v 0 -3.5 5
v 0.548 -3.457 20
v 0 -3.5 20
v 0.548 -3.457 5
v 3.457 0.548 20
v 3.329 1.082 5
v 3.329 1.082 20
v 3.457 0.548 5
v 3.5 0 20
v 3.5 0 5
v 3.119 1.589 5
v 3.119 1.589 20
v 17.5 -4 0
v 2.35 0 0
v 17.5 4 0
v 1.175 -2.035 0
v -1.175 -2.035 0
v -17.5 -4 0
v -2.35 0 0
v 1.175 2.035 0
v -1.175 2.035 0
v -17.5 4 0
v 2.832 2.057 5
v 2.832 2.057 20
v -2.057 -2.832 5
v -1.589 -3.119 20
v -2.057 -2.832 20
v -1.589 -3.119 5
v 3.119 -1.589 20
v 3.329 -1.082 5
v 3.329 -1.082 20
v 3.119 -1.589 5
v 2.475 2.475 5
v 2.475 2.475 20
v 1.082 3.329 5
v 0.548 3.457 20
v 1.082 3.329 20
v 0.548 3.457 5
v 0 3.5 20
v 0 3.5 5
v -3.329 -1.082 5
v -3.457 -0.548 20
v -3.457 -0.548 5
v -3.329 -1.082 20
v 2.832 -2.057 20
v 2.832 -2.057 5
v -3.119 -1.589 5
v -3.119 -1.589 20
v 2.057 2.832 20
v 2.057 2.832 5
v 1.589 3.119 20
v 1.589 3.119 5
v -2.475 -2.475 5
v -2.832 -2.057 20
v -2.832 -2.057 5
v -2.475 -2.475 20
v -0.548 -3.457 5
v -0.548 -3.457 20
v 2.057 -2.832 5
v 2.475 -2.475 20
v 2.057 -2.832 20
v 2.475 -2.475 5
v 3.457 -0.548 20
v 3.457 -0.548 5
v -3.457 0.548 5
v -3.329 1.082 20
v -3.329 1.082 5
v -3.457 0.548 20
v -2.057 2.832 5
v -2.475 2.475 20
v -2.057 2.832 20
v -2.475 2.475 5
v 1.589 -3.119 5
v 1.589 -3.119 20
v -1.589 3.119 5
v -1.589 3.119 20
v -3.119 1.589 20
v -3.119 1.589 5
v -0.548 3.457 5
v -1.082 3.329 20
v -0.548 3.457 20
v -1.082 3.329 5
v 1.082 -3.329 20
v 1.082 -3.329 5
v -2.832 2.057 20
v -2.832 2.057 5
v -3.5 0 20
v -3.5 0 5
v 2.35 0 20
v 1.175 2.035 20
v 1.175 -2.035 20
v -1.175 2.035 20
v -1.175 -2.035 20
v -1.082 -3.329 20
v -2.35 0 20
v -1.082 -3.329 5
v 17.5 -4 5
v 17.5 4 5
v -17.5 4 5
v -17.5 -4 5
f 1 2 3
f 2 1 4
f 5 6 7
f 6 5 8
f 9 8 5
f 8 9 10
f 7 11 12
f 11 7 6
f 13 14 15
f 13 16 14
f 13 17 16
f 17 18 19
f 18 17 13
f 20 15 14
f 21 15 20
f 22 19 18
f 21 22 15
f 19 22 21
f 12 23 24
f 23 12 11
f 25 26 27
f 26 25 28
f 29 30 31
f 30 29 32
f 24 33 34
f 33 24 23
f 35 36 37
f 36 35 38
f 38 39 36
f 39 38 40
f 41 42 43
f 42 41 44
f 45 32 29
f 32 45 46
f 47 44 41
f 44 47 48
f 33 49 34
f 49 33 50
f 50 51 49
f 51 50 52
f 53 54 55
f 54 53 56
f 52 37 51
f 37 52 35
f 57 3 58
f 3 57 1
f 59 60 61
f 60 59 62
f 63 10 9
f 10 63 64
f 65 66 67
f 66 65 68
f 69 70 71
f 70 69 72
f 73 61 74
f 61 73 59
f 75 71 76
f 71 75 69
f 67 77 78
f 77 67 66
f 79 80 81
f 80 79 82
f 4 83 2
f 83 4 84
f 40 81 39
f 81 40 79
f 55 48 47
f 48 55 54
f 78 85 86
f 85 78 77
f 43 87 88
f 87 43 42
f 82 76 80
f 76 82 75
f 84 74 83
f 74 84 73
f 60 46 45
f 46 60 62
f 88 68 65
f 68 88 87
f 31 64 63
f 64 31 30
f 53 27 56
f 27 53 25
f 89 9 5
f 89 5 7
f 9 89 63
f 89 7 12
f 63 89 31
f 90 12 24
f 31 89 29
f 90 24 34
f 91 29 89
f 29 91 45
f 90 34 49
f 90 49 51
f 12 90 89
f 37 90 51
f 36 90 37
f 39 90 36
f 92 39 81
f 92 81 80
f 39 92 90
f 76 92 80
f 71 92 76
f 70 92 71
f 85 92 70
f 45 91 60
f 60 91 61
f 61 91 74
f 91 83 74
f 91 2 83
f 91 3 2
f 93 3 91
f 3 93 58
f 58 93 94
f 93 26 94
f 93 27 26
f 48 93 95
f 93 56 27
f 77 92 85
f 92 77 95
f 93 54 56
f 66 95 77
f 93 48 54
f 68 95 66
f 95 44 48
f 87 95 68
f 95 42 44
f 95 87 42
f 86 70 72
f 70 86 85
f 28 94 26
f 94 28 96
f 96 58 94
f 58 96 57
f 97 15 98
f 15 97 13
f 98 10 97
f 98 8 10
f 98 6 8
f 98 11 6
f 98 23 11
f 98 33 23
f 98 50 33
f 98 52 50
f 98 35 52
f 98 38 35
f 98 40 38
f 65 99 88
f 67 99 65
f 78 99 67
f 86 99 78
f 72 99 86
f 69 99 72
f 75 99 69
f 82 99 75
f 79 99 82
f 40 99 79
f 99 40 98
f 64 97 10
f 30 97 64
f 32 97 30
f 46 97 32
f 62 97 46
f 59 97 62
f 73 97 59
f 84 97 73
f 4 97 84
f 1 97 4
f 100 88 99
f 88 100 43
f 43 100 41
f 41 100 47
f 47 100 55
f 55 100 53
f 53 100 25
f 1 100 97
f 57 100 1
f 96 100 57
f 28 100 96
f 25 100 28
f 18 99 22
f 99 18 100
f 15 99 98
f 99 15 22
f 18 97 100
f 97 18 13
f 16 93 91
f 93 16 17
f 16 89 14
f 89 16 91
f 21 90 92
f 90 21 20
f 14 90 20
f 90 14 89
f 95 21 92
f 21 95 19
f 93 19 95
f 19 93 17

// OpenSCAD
$fn = 40;

module standoff(h, r, cst=1, csb=0) {
  nipple_h = h * 0.8;
  screw_size = 2.0;
  screw_hsize = screw_size / 2.0;
  nut_w = 4.35;
  nut_h = 1.45;
  tol = 0.2;

	// Standoff
  difference() {
    // Standoff body
    cylinder(h=h, r=r, center=true);

    // Screw hole
    translate([0.0, 0.0, h / 2.0 - nipple_h / 2.0]) {
      cylinder(h=nipple_h + 0.1, r=screw_hsize + tol, center=true);
    }

    // Nut-counter-sink top
    if (cst) {
      translate([0.0, 0.0, h / 2.0 - nut_h / 2.0]) {
        cylinder(h=nut_h + 0.01, r=nut_w / 2.0, $fn=6, center=true);
      }
    }

    // Nut-counter-sink bottom
    if (csb) {
      translate([0.0, 0.0, -h / 2.0 + nut_h / 2.0]) {
        cylinder(h=nut_h + 0.01, r=nut_w / 2.0, $fn=6, center=true);
      }
    }
  }

	// Fillet
	if (csb == 0) {
    fillet_h_inc = 0.1;
    fillet_h = 2.0;
    for (fillet_height = [fillet_h_inc:fillet_h_inc:fillet_h]) {
      translate([0.0, 0.0, -h / 2.0 + fillet_height])
        cylinder(h=0.1, r=r * 1.5 - fillet_height);
    }
  }
}

module nuc_standoffs(w, d, h, r) {
  x = 0.0;
  y = 0.0;
  z = h / 2;

  translate([x, y, z]) {
    translate([-d / 2.0, -w / 2.0, 0.0])
      standoff(h, r);

    translate([d / 2.0, -w / 2.0, 0.0])
      standoff(h, r);

    translate([d / 2.0, w / 2.0, 0.0])
      standoff(h, r);

    translate([-d / 2.0, w / 2.0, 0.0])
      standoff(h, r);
  };
}

module pololu_standoffs() {
  screw_size = 2.0;
  screw_hsize = screw_size / 2.0;
  tol = 1.2;

  mount_w = 43.2;
  mount_d = 10.2;
  mount_h = 6.0;

  translate([mount_w / 2.0, mount_d / 2.0, mount_h / 2.0])
    standoff(h=mount_h, r=3.25);
  translate([-mount_w / 2.0, -mount_d / 2.0, mount_h / 2.0])
    standoff(h=mount_h, r=3.25);
}

module stack_module(w, h, plate=1, plate_holes=1, side_holes=1) {
  tol = 1.1;
  screw_size = 3;
  screw_hsize = screw_size / 2.0;
  support_h = h;

  col_start = 30.0;
  col_end = w - col_start;
  dcol = (col_end - col_start) / 3.0;

  // Stack plate
  if (plate) {
    difference() {
      // Plate
      translate([0.0, 0.0, 0.0]) {
        cube([w, w, h], center=true);
      }

      // Frame holes
      for (i = [0 : 90 : 360] ){
        rotate([0, 0, i]) {
          translate([w / 2.0, w / 2.0, 0.0]) {
            cylinder(support_h + 0.01, r=screw_hsize * tol, center=true);
          }
        }
      }
      // Plate holes
      if (plate_holes) {
        hole_r = 6;
        a = w / 5.0;
        b = sqrt(a * a + a * a);

        // Center hole
        cylinder(support_h + 0.01, r=hole_r, center=true);

        // Middle holes
        for (i = [0 : 90 : 360] ){
          rotate([0, 0, i]) {
            translate([a, 0.0, 0.0]) {
              cylinder(support_h + 0.01, r=hole_r, center=true);
            }
          }
        }

        // Corner holes
        for (i = [45 : 90 : 360] ){
          rotate([0, 0, i]) {
            translate([b, 0.0, 0.0]) {
              cylinder(support_h + 0.01, r=hole_r, center=true);
            }
          }
        }
      }
      // Side holes
      if (side_holes) {
        for (i = [0 : 90 : 360] ){
          rotate([0, 0, i]) {
            translate([(w / 2.0) - 12.0, 0.0, 0.0])
              cube([12, w * 0.4, support_h + 0.01], center=true);
            translate([(w / 2.0) - 12.0, (w * 0.4) / 2, 0.0])
              cylinder(support_h + 0.01, r=6, center=true);
            translate([(w / 2.0) - 12.0, -(w * 0.4) / 2, 0.0])
              cylinder(support_h + 0.01, r=6, center=true);
          }
        }
      }
    }
  }

  // Stack through-holes
  for (i = [0 : 90 : 360] ){
    rotate([0, 0, i]) {
      difference() {
        // Ring
        translate([w / 2.0, w / 2.0, 0.0]) {
          cylinder(support_h, r=screw_hsize + 2.5, center=true);
        }

        // Hole
        translate([w / 2.0, w / 2.0, 0.0]) {
          cylinder(support_h + 0.01, r=screw_hsize * tol, center=true);
        }
      }
    }
  }

  // Stack frame support
  for (i = [0 : 90 : 360] ){
    rotate([0, 0, i]) {
      translate([0.0, w / 2.0, 0.0]) {
        cube([w - screw_size - 1, support_h, support_h],  center=true);
      }
    }
  }
}

module stack_spacer(h, nut_counter_sink=1) {
  screw_size = 3.0;
  screw_hsize = screw_size / 2.0;
  nut_w = 6.5;
  nut_h = 2.5;
  tol = 0.2;

  translate([0.0, 0.0, h / 2.0]) {
    difference() {
      // Spacer body
      cylinder(h=h, r=screw_hsize + 2.5, center=true);

      // Thread hole
      cylinder(h=h + 0.01, r=screw_hsize + tol, center=true);
      // Nut counter sinks
      if (nut_counter_sink) {
        translate([0.0, 0.0, h / 2.0 - nut_h / 2.0]) {
          cylinder(h=nut_h + 0.01, r=nut_w / 2.0, $fn=6, center=true);
        }
        translate([0.0, 0.0, -h / 2.0 + nut_h / 2.0]) {
          cylinder(h=nut_h + 0.01, r=nut_w / 2.0, $fn=6, center=true);
        }
      }
    }
  }
}

module nut_tool() {
  tol = 0.2;

  // M3 size
  // tool_h = 25.0;
  // screw_size = 3.0;
  // screw_hsize = screw_size / 2.0;
  // nut_w = 6.5;

  // M2 size
  tool_h = 20.0;
  screw_size = 2.0;
  screw_hsize = screw_size / 2.0;
  nut_w = 4.7;

  wing_w = 35.0;
  wing_d = 8.0;
  wing_h = 5.0;

  translate([0.0, 0.0, tool_h / 2.0]) {
    difference() {
      // Tool body
      union() {
        cylinder(h=tool_h, r=screw_hsize + 2.5, center=true);
        translate([0.0, 0.0, -tool_h / 2.0 + wing_h / 2.0])
        cube([wing_w, wing_d, wing_h], center=true);
      }

      // Tool hole
      cylinder(h=tool_h + 0.01, r=nut_w / 2.0, $fn=6, center=true);
    }
  }
}

module pwr_stack(w, h, batt_w, batt_d, batt_h) {
  screw_size = 3.0;
  screw_hsize = screw_size / 2.0;
  mount_r = 2.5;
  nut_w = 6.5;
  nut_h = 3;
  tol = 1.2;

  // Stack module plate
  difference() {
    union() {
      stack_module(w, h, 1, 0, 0);

      translate([(w - 30) / 2.0, 35, h / 2.0 + nut_h / 2.0])
        cylinder(nut_h, r=screw_hsize + mount_r, center=true);
      translate([-(w - 30) / 2.0, 35, h / 2.0 + nut_h / 2.0])
        cylinder(nut_h, r=screw_hsize + mount_r, center=true);
      translate([(w - 30) / 2.0, -35, h / 2.0 + nut_h / 2.0])
        cylinder(nut_h, r=screw_hsize + mount_r, center=true);
      translate([-(w - 30) / 2.0, -35, h / 2.0 + nut_h / 2.0])
        cylinder(nut_h, r=screw_hsize + mount_r, center=true);
    }

    // Battery strap holes
    translate([0.0, batt_w / 2.0 + 3, 0.0])
      cube([25, 3, h * 2.0 + 0.01], center=true);
    translate([0.0, -batt_w / 2.0 - 3, 0.0])
      cube([25, 3, h * 2.0 + 0.01], center=true);

    // Mount holes
    translate([(w - 30) / 2.0, 35, 0.0])
      cylinder(20, r=screw_hsize * tol, center=true);
    translate([-(w - 30) / 2.0, 35, 0.0])
      cylinder(20, r=screw_hsize * tol, center=true);
    translate([(w - 30) / 2.0, -35, 0.0])
      cylinder(20, r=screw_hsize * tol, center=true);
    translate([-(w - 30) / 2.0, -35, 0.0])
      cylinder(20, r=screw_hsize * tol, center=true);

    // Mount nut counter sinks
    // -- Front left
    translate([(w - 30) / 2.0, 35, h / 2.0 + nut_h / 2.0]) {
      cylinder(h=nut_h + 0.01, r=nut_w / 2.0, $fn=6, center=true);
    }
    // -- Front right
    translate([(w - 30) / 2.0, -35, h / 2.0 + nut_h / 2.0]) {
      cylinder(h=nut_h + 0.01, r=nut_w / 2.0, $fn=6, center=true);
    }
    // -- Back right
    translate([-(w - 30) / 2.0, -35, h / 2.0 + nut_h / 2.0]) {
      cylinder(h=nut_h + 0.01, r=nut_w / 2.0, $fn=6, center=true);
    }
    // -- Back left
    translate([-(w - 30) / 2.0, 35, h / 2.0 + nut_h / 2.0]) {
      cylinder(h=nut_h + 0.01, r=nut_w / 2.0, $fn=6, center=true);
    }
  }

  // Rear cable rails
  difference() {
    translate([-w / 2.0 - 4.5, 0.0, 0.0])
      cube([8.0, 90.0, h], center=true);

    translate([-w / 2.0 - 4.5, 0.0, 0.0])
      cube([4.0, 85.0, h + 0.1], center=true);
  }

  // Voltage-regulator standoffs
  translate([0.0, 40.0, h / 2.0])
    pololu_standoffs();
}

module nuc_stack(w, h) {
  // Parameters
  pcb_w = 95.0;
  pcb_d = 90.4;
  standoff_h = 12.0;
  standoff_r = 2.5;

  // NUC plate
  stack_module(w, h);

  // Front cable rails
  difference() {
    translate([w / 2.0 + 4.5, 0.0, 0.0])
      cube([8.0, 50.0, h], center=true);

    translate([w / 2.0 + 4.5, 0.0, 0.0])
      cube([4.0, 45.0, h + 0.1], center=true);
  }

  // Rear cable rails
  difference() {
    translate([-w / 2.0 - 4.5, 0.0, 0.0])
      cube([8.0, 90.0, h], center=true);

    translate([-w / 2.0 - 4.5, 0.0, 0.0])
      cube([4.0, 85.0, h + 0.1], center=true);
  }

  // NUC standoffs
  translate([0.0, 0.0, h / 2])
    nuc_standoffs(pcb_w, pcb_d, standoff_h, standoff_r);
}

module realsense_stack(w, h) {
  screw_size = 3.0;
  screw_hsize = screw_size / 2.0;
  tol = 0.2;

  holes_w = 45.0;
  mount_w = 65.0;
  mount_d = 25.0;
  mount_h = 3.0;

  // Stack frame top
  translate([0.0, 0.0, 0.0])
    stack_module(w, h, plate=0, plate_holes=0, side_holes=0);

  // Stack frame bottom
  translate([0.0, 0.0, mount_d + h / 2.0])
    stack_module(w, h, plate=0, plate_holes=0, side_holes=0);

  // Corner spacers
  for (i = [0 : 90 : 360] ){
    rotate([0, 0, i]) {
      difference() {
        // Spacer
        translate([w / 2.0, w / 2.0, mount_d / 2.0]) {
          cylinder(mount_d, r=screw_hsize + 2.5, center=true);
        }

        // Hole
        translate([w / 2.0, w / 2.0, mount_d / 2.0]) {
          cylinder(mount_d + 0.01, r=screw_hsize + tol, center=true);
        }
      }
    }
  }

  // Cable management
  difference() {
    cube([w, 20.0, mount_h],  center=true);

    translate([0.0, 5.0, 0.0])
      cube([10.0, 2.0, mount_h + 0.01],  center=true);
    translate([0.0, -5.0, 0.0])
      cube([10.0, 2.0, mount_h + 0.01],  center=true);
    translate([w * 0.25, 5.0, 0.0])
      cube([10.0, 2.0, mount_h + 0.01],  center=true);
    translate([w * 0.25, -5.0, 0.0])
      cube([10.0, 2.0, mount_h + 0.01],  center=true);
    translate([-w * 0.25, 5.0, 0.0])
      cube([10.0, 2.0, mount_h + 0.01],  center=true);
    translate([-w * 0.25, -5.0, 0.0])
      cube([10.0, 2.0, mount_h + 0.01],  center=true);
  }

  // Realsense back plate
  translate([w / 2.0, 0.0, mount_d / 2.0 + h / 2.0])
  rotate([90.0, 0.0, 90.0])
  difference() {
    cube([mount_w, mount_d, mount_h],  center=true);

    translate([holes_w / 2.0, 0.0, 0.0]) {
      cylinder(h=mount_h + 0.01, r=(screw_size / 2.0) + tol, center=true);
    }
    translate([-holes_w / 2.0, 0.0, 0.0]) {
      cylinder(h=mount_h + 0.01, r=(screw_size / 2.0) + tol, center=true);
    }
  }
}

module rig_handle(w, h) {
  screw_size = 3;
  screw_hsize = screw_size / 2.0;
  support_h = h;
  tol = 0.2;

  // Lower
  translate([0.0, 0.0, support_h / 2.0]) {
    difference() {
      // Rings
      union() {
        translate([0.0, w / 2.0, 0.0]) {
          cylinder(support_h, r=screw_hsize * 2.3, center=true);
        }
        translate([0.0, -w / 2.0, 0.0]) {
          cylinder(support_h, r=screw_hsize * 2.3, center=true);
        }
      }

      // Hole
      translate([0.0, w / 2.0, 0.0]) {
        cylinder(support_h + 0.01, r=screw_hsize + tol, center=true);
      }
      translate([0.0, -w / 2.0, 0.0]) {
        cylinder(support_h + 0.01, r=screw_hsize + tol, center=true);
      }
    }

    // Support
    translate([0.0, 0.0, 0.0]) {
      cube([support_h, w - screw_size - 1, support_h],  center=true);
    }
  }

  // Upper
  translate([0.0, 0.0, 70.0 - support_h / 2.0]) {
    difference() {
      // Rings
      union() {
        translate([0.0, w / 2.0, 0.0]) {
          cylinder(support_h, r=screw_hsize * 2.3, center=true);
        }
        translate([0.0, -w / 2.0, 0.0]) {
          cylinder(support_h, r=screw_hsize * 2.3, center=true);
        }
      }

      // Hole
      translate([0.0, w / 2.0, 0.0]) {
        cylinder(support_h + 0.01, r=screw_hsize + tol, center=true);
      }
      translate([0.0, -w / 2.0, 0.0]) {
        cylinder(support_h + 0.01, r=screw_hsize + tol, center=true);
      }
    }

    // Support
    translate([0.0, 0.0, 0.0]) {
      cube([support_h, w - screw_size - 1, support_h],  center=true);
    }
  }

  // Handle
  handle_d = 25.0;
  translate([-handle_d, 0.0, support_h / 2.0])
    cube([handle_d * 2, 20.0 * 2.0, support_h],  center=true);

  translate([-handle_d, 0.0, 70.0 - support_h / 2.0])
    cube([handle_d * 2, 20.0 * 2.0, support_h],  center=true);

  translate([-handle_d * 2.0, 0.0, 0.0])
    difference() {
      cylinder(70.0, r = 20.0);

      // translate([0.0, 0.0, 70.0 / 2.0])
      //   #cylinder(70.0 + 0.01, r = 18, center=true);
    }
}

module assembly(show_sbc=1, show_cam=1, show_voltreg=1, show_batt=1) {
  stack_w = 110;
  stack_d = 110;
  stack_h = 3.0;

  batt_w = 48.0;
  batt_d = 140.0;
  batt_h = 27.0;

  pololu_w = 48.3;
  pololu_d = 15.2;

  // Intel NUC
  if (show_sbc) {
    color([0.0, 0.0, 1.0])
    translate([0, 0, -14]) {
      rotate([90.0, 0.0, 90.0]) {
        import("/home/chutsu/projects/proto_parts/Intel_NUC7i5DN/NUC7i5DN.STL");
      }
    }
  }

  // Intel RealSense D435i
  if (show_cam) {
    color([1.0, 0.0, 0.0])
    translate([stack_w / 2.0 + 26.5, 0, -16]) {
      rotate([90.0, 0.0, 90.0]) {
        import("/home/chutsu/projects/proto_parts/Intel_RealSense_D435i/D435i.STL");
      }
    }
  }

  // Pololu Voltage Regulator U3V50X
  if (show_voltreg) {
    color([0, 1, 0])
    translate([-pololu_w / 2.0, (-pololu_d / 2.0) + 40.0, 40.5]) {
      rotate([0.0, 0.0, 0.0]) {
        import("/home/chutsu/projects/proto_parts/Pololu_U3V50X/Pololu-U3V50X.STL");
      }
    }
  }

  // Battery
  if (show_batt) {
    color([1.0, 0.0, 1.0])
    translate([0.0, 0.0, 33.0])
      rotate([0.0, 0.0, 90.0])
        translate([0.0, 0.0, batt_h / 2.0 + stack_h / 2.0])
          cube([batt_w, batt_d, batt_h], center=true);
  }

  // PWR stack
  translate([0.0, 0.0, 33.0])
    pwr_stack(stack_w, stack_h, batt_w, batt_d, batt_h);

  // Intel NUC stack module
  nuc_stack(stack_w, stack_h);

  // NUC stack spacers
  for (i = [0 : 90 : 360] ){
    rotate([0, 0, i]) {
      translate([stack_w / 2.0, stack_d / 2.0, stack_h / 2.0])
        stack_spacer(30.0);
    }
  }

  // RealSense holder
  translate([0.0, 0.0, -30.0])
    realsense_stack(stack_w, stack_h);
}

// ASSEMBLY
// assembly(show_sbc=1, show_cam=1, show_voltreg=1, show_batt=1);

// PRINTS
stack_w = 110;
stack_h = 3.0;
batt_w = 48.0;
batt_d = 140.0;
batt_h = 27.0;

nut_tool();
// rig_handle(stack_w, stack_h);
// pwr_stack(stack_w, stack_h, batt_w, batt_d, batt_h);
// realsense_stack(stack_w, stack_h);
// nuc_stack(stack_w, stack_h);
